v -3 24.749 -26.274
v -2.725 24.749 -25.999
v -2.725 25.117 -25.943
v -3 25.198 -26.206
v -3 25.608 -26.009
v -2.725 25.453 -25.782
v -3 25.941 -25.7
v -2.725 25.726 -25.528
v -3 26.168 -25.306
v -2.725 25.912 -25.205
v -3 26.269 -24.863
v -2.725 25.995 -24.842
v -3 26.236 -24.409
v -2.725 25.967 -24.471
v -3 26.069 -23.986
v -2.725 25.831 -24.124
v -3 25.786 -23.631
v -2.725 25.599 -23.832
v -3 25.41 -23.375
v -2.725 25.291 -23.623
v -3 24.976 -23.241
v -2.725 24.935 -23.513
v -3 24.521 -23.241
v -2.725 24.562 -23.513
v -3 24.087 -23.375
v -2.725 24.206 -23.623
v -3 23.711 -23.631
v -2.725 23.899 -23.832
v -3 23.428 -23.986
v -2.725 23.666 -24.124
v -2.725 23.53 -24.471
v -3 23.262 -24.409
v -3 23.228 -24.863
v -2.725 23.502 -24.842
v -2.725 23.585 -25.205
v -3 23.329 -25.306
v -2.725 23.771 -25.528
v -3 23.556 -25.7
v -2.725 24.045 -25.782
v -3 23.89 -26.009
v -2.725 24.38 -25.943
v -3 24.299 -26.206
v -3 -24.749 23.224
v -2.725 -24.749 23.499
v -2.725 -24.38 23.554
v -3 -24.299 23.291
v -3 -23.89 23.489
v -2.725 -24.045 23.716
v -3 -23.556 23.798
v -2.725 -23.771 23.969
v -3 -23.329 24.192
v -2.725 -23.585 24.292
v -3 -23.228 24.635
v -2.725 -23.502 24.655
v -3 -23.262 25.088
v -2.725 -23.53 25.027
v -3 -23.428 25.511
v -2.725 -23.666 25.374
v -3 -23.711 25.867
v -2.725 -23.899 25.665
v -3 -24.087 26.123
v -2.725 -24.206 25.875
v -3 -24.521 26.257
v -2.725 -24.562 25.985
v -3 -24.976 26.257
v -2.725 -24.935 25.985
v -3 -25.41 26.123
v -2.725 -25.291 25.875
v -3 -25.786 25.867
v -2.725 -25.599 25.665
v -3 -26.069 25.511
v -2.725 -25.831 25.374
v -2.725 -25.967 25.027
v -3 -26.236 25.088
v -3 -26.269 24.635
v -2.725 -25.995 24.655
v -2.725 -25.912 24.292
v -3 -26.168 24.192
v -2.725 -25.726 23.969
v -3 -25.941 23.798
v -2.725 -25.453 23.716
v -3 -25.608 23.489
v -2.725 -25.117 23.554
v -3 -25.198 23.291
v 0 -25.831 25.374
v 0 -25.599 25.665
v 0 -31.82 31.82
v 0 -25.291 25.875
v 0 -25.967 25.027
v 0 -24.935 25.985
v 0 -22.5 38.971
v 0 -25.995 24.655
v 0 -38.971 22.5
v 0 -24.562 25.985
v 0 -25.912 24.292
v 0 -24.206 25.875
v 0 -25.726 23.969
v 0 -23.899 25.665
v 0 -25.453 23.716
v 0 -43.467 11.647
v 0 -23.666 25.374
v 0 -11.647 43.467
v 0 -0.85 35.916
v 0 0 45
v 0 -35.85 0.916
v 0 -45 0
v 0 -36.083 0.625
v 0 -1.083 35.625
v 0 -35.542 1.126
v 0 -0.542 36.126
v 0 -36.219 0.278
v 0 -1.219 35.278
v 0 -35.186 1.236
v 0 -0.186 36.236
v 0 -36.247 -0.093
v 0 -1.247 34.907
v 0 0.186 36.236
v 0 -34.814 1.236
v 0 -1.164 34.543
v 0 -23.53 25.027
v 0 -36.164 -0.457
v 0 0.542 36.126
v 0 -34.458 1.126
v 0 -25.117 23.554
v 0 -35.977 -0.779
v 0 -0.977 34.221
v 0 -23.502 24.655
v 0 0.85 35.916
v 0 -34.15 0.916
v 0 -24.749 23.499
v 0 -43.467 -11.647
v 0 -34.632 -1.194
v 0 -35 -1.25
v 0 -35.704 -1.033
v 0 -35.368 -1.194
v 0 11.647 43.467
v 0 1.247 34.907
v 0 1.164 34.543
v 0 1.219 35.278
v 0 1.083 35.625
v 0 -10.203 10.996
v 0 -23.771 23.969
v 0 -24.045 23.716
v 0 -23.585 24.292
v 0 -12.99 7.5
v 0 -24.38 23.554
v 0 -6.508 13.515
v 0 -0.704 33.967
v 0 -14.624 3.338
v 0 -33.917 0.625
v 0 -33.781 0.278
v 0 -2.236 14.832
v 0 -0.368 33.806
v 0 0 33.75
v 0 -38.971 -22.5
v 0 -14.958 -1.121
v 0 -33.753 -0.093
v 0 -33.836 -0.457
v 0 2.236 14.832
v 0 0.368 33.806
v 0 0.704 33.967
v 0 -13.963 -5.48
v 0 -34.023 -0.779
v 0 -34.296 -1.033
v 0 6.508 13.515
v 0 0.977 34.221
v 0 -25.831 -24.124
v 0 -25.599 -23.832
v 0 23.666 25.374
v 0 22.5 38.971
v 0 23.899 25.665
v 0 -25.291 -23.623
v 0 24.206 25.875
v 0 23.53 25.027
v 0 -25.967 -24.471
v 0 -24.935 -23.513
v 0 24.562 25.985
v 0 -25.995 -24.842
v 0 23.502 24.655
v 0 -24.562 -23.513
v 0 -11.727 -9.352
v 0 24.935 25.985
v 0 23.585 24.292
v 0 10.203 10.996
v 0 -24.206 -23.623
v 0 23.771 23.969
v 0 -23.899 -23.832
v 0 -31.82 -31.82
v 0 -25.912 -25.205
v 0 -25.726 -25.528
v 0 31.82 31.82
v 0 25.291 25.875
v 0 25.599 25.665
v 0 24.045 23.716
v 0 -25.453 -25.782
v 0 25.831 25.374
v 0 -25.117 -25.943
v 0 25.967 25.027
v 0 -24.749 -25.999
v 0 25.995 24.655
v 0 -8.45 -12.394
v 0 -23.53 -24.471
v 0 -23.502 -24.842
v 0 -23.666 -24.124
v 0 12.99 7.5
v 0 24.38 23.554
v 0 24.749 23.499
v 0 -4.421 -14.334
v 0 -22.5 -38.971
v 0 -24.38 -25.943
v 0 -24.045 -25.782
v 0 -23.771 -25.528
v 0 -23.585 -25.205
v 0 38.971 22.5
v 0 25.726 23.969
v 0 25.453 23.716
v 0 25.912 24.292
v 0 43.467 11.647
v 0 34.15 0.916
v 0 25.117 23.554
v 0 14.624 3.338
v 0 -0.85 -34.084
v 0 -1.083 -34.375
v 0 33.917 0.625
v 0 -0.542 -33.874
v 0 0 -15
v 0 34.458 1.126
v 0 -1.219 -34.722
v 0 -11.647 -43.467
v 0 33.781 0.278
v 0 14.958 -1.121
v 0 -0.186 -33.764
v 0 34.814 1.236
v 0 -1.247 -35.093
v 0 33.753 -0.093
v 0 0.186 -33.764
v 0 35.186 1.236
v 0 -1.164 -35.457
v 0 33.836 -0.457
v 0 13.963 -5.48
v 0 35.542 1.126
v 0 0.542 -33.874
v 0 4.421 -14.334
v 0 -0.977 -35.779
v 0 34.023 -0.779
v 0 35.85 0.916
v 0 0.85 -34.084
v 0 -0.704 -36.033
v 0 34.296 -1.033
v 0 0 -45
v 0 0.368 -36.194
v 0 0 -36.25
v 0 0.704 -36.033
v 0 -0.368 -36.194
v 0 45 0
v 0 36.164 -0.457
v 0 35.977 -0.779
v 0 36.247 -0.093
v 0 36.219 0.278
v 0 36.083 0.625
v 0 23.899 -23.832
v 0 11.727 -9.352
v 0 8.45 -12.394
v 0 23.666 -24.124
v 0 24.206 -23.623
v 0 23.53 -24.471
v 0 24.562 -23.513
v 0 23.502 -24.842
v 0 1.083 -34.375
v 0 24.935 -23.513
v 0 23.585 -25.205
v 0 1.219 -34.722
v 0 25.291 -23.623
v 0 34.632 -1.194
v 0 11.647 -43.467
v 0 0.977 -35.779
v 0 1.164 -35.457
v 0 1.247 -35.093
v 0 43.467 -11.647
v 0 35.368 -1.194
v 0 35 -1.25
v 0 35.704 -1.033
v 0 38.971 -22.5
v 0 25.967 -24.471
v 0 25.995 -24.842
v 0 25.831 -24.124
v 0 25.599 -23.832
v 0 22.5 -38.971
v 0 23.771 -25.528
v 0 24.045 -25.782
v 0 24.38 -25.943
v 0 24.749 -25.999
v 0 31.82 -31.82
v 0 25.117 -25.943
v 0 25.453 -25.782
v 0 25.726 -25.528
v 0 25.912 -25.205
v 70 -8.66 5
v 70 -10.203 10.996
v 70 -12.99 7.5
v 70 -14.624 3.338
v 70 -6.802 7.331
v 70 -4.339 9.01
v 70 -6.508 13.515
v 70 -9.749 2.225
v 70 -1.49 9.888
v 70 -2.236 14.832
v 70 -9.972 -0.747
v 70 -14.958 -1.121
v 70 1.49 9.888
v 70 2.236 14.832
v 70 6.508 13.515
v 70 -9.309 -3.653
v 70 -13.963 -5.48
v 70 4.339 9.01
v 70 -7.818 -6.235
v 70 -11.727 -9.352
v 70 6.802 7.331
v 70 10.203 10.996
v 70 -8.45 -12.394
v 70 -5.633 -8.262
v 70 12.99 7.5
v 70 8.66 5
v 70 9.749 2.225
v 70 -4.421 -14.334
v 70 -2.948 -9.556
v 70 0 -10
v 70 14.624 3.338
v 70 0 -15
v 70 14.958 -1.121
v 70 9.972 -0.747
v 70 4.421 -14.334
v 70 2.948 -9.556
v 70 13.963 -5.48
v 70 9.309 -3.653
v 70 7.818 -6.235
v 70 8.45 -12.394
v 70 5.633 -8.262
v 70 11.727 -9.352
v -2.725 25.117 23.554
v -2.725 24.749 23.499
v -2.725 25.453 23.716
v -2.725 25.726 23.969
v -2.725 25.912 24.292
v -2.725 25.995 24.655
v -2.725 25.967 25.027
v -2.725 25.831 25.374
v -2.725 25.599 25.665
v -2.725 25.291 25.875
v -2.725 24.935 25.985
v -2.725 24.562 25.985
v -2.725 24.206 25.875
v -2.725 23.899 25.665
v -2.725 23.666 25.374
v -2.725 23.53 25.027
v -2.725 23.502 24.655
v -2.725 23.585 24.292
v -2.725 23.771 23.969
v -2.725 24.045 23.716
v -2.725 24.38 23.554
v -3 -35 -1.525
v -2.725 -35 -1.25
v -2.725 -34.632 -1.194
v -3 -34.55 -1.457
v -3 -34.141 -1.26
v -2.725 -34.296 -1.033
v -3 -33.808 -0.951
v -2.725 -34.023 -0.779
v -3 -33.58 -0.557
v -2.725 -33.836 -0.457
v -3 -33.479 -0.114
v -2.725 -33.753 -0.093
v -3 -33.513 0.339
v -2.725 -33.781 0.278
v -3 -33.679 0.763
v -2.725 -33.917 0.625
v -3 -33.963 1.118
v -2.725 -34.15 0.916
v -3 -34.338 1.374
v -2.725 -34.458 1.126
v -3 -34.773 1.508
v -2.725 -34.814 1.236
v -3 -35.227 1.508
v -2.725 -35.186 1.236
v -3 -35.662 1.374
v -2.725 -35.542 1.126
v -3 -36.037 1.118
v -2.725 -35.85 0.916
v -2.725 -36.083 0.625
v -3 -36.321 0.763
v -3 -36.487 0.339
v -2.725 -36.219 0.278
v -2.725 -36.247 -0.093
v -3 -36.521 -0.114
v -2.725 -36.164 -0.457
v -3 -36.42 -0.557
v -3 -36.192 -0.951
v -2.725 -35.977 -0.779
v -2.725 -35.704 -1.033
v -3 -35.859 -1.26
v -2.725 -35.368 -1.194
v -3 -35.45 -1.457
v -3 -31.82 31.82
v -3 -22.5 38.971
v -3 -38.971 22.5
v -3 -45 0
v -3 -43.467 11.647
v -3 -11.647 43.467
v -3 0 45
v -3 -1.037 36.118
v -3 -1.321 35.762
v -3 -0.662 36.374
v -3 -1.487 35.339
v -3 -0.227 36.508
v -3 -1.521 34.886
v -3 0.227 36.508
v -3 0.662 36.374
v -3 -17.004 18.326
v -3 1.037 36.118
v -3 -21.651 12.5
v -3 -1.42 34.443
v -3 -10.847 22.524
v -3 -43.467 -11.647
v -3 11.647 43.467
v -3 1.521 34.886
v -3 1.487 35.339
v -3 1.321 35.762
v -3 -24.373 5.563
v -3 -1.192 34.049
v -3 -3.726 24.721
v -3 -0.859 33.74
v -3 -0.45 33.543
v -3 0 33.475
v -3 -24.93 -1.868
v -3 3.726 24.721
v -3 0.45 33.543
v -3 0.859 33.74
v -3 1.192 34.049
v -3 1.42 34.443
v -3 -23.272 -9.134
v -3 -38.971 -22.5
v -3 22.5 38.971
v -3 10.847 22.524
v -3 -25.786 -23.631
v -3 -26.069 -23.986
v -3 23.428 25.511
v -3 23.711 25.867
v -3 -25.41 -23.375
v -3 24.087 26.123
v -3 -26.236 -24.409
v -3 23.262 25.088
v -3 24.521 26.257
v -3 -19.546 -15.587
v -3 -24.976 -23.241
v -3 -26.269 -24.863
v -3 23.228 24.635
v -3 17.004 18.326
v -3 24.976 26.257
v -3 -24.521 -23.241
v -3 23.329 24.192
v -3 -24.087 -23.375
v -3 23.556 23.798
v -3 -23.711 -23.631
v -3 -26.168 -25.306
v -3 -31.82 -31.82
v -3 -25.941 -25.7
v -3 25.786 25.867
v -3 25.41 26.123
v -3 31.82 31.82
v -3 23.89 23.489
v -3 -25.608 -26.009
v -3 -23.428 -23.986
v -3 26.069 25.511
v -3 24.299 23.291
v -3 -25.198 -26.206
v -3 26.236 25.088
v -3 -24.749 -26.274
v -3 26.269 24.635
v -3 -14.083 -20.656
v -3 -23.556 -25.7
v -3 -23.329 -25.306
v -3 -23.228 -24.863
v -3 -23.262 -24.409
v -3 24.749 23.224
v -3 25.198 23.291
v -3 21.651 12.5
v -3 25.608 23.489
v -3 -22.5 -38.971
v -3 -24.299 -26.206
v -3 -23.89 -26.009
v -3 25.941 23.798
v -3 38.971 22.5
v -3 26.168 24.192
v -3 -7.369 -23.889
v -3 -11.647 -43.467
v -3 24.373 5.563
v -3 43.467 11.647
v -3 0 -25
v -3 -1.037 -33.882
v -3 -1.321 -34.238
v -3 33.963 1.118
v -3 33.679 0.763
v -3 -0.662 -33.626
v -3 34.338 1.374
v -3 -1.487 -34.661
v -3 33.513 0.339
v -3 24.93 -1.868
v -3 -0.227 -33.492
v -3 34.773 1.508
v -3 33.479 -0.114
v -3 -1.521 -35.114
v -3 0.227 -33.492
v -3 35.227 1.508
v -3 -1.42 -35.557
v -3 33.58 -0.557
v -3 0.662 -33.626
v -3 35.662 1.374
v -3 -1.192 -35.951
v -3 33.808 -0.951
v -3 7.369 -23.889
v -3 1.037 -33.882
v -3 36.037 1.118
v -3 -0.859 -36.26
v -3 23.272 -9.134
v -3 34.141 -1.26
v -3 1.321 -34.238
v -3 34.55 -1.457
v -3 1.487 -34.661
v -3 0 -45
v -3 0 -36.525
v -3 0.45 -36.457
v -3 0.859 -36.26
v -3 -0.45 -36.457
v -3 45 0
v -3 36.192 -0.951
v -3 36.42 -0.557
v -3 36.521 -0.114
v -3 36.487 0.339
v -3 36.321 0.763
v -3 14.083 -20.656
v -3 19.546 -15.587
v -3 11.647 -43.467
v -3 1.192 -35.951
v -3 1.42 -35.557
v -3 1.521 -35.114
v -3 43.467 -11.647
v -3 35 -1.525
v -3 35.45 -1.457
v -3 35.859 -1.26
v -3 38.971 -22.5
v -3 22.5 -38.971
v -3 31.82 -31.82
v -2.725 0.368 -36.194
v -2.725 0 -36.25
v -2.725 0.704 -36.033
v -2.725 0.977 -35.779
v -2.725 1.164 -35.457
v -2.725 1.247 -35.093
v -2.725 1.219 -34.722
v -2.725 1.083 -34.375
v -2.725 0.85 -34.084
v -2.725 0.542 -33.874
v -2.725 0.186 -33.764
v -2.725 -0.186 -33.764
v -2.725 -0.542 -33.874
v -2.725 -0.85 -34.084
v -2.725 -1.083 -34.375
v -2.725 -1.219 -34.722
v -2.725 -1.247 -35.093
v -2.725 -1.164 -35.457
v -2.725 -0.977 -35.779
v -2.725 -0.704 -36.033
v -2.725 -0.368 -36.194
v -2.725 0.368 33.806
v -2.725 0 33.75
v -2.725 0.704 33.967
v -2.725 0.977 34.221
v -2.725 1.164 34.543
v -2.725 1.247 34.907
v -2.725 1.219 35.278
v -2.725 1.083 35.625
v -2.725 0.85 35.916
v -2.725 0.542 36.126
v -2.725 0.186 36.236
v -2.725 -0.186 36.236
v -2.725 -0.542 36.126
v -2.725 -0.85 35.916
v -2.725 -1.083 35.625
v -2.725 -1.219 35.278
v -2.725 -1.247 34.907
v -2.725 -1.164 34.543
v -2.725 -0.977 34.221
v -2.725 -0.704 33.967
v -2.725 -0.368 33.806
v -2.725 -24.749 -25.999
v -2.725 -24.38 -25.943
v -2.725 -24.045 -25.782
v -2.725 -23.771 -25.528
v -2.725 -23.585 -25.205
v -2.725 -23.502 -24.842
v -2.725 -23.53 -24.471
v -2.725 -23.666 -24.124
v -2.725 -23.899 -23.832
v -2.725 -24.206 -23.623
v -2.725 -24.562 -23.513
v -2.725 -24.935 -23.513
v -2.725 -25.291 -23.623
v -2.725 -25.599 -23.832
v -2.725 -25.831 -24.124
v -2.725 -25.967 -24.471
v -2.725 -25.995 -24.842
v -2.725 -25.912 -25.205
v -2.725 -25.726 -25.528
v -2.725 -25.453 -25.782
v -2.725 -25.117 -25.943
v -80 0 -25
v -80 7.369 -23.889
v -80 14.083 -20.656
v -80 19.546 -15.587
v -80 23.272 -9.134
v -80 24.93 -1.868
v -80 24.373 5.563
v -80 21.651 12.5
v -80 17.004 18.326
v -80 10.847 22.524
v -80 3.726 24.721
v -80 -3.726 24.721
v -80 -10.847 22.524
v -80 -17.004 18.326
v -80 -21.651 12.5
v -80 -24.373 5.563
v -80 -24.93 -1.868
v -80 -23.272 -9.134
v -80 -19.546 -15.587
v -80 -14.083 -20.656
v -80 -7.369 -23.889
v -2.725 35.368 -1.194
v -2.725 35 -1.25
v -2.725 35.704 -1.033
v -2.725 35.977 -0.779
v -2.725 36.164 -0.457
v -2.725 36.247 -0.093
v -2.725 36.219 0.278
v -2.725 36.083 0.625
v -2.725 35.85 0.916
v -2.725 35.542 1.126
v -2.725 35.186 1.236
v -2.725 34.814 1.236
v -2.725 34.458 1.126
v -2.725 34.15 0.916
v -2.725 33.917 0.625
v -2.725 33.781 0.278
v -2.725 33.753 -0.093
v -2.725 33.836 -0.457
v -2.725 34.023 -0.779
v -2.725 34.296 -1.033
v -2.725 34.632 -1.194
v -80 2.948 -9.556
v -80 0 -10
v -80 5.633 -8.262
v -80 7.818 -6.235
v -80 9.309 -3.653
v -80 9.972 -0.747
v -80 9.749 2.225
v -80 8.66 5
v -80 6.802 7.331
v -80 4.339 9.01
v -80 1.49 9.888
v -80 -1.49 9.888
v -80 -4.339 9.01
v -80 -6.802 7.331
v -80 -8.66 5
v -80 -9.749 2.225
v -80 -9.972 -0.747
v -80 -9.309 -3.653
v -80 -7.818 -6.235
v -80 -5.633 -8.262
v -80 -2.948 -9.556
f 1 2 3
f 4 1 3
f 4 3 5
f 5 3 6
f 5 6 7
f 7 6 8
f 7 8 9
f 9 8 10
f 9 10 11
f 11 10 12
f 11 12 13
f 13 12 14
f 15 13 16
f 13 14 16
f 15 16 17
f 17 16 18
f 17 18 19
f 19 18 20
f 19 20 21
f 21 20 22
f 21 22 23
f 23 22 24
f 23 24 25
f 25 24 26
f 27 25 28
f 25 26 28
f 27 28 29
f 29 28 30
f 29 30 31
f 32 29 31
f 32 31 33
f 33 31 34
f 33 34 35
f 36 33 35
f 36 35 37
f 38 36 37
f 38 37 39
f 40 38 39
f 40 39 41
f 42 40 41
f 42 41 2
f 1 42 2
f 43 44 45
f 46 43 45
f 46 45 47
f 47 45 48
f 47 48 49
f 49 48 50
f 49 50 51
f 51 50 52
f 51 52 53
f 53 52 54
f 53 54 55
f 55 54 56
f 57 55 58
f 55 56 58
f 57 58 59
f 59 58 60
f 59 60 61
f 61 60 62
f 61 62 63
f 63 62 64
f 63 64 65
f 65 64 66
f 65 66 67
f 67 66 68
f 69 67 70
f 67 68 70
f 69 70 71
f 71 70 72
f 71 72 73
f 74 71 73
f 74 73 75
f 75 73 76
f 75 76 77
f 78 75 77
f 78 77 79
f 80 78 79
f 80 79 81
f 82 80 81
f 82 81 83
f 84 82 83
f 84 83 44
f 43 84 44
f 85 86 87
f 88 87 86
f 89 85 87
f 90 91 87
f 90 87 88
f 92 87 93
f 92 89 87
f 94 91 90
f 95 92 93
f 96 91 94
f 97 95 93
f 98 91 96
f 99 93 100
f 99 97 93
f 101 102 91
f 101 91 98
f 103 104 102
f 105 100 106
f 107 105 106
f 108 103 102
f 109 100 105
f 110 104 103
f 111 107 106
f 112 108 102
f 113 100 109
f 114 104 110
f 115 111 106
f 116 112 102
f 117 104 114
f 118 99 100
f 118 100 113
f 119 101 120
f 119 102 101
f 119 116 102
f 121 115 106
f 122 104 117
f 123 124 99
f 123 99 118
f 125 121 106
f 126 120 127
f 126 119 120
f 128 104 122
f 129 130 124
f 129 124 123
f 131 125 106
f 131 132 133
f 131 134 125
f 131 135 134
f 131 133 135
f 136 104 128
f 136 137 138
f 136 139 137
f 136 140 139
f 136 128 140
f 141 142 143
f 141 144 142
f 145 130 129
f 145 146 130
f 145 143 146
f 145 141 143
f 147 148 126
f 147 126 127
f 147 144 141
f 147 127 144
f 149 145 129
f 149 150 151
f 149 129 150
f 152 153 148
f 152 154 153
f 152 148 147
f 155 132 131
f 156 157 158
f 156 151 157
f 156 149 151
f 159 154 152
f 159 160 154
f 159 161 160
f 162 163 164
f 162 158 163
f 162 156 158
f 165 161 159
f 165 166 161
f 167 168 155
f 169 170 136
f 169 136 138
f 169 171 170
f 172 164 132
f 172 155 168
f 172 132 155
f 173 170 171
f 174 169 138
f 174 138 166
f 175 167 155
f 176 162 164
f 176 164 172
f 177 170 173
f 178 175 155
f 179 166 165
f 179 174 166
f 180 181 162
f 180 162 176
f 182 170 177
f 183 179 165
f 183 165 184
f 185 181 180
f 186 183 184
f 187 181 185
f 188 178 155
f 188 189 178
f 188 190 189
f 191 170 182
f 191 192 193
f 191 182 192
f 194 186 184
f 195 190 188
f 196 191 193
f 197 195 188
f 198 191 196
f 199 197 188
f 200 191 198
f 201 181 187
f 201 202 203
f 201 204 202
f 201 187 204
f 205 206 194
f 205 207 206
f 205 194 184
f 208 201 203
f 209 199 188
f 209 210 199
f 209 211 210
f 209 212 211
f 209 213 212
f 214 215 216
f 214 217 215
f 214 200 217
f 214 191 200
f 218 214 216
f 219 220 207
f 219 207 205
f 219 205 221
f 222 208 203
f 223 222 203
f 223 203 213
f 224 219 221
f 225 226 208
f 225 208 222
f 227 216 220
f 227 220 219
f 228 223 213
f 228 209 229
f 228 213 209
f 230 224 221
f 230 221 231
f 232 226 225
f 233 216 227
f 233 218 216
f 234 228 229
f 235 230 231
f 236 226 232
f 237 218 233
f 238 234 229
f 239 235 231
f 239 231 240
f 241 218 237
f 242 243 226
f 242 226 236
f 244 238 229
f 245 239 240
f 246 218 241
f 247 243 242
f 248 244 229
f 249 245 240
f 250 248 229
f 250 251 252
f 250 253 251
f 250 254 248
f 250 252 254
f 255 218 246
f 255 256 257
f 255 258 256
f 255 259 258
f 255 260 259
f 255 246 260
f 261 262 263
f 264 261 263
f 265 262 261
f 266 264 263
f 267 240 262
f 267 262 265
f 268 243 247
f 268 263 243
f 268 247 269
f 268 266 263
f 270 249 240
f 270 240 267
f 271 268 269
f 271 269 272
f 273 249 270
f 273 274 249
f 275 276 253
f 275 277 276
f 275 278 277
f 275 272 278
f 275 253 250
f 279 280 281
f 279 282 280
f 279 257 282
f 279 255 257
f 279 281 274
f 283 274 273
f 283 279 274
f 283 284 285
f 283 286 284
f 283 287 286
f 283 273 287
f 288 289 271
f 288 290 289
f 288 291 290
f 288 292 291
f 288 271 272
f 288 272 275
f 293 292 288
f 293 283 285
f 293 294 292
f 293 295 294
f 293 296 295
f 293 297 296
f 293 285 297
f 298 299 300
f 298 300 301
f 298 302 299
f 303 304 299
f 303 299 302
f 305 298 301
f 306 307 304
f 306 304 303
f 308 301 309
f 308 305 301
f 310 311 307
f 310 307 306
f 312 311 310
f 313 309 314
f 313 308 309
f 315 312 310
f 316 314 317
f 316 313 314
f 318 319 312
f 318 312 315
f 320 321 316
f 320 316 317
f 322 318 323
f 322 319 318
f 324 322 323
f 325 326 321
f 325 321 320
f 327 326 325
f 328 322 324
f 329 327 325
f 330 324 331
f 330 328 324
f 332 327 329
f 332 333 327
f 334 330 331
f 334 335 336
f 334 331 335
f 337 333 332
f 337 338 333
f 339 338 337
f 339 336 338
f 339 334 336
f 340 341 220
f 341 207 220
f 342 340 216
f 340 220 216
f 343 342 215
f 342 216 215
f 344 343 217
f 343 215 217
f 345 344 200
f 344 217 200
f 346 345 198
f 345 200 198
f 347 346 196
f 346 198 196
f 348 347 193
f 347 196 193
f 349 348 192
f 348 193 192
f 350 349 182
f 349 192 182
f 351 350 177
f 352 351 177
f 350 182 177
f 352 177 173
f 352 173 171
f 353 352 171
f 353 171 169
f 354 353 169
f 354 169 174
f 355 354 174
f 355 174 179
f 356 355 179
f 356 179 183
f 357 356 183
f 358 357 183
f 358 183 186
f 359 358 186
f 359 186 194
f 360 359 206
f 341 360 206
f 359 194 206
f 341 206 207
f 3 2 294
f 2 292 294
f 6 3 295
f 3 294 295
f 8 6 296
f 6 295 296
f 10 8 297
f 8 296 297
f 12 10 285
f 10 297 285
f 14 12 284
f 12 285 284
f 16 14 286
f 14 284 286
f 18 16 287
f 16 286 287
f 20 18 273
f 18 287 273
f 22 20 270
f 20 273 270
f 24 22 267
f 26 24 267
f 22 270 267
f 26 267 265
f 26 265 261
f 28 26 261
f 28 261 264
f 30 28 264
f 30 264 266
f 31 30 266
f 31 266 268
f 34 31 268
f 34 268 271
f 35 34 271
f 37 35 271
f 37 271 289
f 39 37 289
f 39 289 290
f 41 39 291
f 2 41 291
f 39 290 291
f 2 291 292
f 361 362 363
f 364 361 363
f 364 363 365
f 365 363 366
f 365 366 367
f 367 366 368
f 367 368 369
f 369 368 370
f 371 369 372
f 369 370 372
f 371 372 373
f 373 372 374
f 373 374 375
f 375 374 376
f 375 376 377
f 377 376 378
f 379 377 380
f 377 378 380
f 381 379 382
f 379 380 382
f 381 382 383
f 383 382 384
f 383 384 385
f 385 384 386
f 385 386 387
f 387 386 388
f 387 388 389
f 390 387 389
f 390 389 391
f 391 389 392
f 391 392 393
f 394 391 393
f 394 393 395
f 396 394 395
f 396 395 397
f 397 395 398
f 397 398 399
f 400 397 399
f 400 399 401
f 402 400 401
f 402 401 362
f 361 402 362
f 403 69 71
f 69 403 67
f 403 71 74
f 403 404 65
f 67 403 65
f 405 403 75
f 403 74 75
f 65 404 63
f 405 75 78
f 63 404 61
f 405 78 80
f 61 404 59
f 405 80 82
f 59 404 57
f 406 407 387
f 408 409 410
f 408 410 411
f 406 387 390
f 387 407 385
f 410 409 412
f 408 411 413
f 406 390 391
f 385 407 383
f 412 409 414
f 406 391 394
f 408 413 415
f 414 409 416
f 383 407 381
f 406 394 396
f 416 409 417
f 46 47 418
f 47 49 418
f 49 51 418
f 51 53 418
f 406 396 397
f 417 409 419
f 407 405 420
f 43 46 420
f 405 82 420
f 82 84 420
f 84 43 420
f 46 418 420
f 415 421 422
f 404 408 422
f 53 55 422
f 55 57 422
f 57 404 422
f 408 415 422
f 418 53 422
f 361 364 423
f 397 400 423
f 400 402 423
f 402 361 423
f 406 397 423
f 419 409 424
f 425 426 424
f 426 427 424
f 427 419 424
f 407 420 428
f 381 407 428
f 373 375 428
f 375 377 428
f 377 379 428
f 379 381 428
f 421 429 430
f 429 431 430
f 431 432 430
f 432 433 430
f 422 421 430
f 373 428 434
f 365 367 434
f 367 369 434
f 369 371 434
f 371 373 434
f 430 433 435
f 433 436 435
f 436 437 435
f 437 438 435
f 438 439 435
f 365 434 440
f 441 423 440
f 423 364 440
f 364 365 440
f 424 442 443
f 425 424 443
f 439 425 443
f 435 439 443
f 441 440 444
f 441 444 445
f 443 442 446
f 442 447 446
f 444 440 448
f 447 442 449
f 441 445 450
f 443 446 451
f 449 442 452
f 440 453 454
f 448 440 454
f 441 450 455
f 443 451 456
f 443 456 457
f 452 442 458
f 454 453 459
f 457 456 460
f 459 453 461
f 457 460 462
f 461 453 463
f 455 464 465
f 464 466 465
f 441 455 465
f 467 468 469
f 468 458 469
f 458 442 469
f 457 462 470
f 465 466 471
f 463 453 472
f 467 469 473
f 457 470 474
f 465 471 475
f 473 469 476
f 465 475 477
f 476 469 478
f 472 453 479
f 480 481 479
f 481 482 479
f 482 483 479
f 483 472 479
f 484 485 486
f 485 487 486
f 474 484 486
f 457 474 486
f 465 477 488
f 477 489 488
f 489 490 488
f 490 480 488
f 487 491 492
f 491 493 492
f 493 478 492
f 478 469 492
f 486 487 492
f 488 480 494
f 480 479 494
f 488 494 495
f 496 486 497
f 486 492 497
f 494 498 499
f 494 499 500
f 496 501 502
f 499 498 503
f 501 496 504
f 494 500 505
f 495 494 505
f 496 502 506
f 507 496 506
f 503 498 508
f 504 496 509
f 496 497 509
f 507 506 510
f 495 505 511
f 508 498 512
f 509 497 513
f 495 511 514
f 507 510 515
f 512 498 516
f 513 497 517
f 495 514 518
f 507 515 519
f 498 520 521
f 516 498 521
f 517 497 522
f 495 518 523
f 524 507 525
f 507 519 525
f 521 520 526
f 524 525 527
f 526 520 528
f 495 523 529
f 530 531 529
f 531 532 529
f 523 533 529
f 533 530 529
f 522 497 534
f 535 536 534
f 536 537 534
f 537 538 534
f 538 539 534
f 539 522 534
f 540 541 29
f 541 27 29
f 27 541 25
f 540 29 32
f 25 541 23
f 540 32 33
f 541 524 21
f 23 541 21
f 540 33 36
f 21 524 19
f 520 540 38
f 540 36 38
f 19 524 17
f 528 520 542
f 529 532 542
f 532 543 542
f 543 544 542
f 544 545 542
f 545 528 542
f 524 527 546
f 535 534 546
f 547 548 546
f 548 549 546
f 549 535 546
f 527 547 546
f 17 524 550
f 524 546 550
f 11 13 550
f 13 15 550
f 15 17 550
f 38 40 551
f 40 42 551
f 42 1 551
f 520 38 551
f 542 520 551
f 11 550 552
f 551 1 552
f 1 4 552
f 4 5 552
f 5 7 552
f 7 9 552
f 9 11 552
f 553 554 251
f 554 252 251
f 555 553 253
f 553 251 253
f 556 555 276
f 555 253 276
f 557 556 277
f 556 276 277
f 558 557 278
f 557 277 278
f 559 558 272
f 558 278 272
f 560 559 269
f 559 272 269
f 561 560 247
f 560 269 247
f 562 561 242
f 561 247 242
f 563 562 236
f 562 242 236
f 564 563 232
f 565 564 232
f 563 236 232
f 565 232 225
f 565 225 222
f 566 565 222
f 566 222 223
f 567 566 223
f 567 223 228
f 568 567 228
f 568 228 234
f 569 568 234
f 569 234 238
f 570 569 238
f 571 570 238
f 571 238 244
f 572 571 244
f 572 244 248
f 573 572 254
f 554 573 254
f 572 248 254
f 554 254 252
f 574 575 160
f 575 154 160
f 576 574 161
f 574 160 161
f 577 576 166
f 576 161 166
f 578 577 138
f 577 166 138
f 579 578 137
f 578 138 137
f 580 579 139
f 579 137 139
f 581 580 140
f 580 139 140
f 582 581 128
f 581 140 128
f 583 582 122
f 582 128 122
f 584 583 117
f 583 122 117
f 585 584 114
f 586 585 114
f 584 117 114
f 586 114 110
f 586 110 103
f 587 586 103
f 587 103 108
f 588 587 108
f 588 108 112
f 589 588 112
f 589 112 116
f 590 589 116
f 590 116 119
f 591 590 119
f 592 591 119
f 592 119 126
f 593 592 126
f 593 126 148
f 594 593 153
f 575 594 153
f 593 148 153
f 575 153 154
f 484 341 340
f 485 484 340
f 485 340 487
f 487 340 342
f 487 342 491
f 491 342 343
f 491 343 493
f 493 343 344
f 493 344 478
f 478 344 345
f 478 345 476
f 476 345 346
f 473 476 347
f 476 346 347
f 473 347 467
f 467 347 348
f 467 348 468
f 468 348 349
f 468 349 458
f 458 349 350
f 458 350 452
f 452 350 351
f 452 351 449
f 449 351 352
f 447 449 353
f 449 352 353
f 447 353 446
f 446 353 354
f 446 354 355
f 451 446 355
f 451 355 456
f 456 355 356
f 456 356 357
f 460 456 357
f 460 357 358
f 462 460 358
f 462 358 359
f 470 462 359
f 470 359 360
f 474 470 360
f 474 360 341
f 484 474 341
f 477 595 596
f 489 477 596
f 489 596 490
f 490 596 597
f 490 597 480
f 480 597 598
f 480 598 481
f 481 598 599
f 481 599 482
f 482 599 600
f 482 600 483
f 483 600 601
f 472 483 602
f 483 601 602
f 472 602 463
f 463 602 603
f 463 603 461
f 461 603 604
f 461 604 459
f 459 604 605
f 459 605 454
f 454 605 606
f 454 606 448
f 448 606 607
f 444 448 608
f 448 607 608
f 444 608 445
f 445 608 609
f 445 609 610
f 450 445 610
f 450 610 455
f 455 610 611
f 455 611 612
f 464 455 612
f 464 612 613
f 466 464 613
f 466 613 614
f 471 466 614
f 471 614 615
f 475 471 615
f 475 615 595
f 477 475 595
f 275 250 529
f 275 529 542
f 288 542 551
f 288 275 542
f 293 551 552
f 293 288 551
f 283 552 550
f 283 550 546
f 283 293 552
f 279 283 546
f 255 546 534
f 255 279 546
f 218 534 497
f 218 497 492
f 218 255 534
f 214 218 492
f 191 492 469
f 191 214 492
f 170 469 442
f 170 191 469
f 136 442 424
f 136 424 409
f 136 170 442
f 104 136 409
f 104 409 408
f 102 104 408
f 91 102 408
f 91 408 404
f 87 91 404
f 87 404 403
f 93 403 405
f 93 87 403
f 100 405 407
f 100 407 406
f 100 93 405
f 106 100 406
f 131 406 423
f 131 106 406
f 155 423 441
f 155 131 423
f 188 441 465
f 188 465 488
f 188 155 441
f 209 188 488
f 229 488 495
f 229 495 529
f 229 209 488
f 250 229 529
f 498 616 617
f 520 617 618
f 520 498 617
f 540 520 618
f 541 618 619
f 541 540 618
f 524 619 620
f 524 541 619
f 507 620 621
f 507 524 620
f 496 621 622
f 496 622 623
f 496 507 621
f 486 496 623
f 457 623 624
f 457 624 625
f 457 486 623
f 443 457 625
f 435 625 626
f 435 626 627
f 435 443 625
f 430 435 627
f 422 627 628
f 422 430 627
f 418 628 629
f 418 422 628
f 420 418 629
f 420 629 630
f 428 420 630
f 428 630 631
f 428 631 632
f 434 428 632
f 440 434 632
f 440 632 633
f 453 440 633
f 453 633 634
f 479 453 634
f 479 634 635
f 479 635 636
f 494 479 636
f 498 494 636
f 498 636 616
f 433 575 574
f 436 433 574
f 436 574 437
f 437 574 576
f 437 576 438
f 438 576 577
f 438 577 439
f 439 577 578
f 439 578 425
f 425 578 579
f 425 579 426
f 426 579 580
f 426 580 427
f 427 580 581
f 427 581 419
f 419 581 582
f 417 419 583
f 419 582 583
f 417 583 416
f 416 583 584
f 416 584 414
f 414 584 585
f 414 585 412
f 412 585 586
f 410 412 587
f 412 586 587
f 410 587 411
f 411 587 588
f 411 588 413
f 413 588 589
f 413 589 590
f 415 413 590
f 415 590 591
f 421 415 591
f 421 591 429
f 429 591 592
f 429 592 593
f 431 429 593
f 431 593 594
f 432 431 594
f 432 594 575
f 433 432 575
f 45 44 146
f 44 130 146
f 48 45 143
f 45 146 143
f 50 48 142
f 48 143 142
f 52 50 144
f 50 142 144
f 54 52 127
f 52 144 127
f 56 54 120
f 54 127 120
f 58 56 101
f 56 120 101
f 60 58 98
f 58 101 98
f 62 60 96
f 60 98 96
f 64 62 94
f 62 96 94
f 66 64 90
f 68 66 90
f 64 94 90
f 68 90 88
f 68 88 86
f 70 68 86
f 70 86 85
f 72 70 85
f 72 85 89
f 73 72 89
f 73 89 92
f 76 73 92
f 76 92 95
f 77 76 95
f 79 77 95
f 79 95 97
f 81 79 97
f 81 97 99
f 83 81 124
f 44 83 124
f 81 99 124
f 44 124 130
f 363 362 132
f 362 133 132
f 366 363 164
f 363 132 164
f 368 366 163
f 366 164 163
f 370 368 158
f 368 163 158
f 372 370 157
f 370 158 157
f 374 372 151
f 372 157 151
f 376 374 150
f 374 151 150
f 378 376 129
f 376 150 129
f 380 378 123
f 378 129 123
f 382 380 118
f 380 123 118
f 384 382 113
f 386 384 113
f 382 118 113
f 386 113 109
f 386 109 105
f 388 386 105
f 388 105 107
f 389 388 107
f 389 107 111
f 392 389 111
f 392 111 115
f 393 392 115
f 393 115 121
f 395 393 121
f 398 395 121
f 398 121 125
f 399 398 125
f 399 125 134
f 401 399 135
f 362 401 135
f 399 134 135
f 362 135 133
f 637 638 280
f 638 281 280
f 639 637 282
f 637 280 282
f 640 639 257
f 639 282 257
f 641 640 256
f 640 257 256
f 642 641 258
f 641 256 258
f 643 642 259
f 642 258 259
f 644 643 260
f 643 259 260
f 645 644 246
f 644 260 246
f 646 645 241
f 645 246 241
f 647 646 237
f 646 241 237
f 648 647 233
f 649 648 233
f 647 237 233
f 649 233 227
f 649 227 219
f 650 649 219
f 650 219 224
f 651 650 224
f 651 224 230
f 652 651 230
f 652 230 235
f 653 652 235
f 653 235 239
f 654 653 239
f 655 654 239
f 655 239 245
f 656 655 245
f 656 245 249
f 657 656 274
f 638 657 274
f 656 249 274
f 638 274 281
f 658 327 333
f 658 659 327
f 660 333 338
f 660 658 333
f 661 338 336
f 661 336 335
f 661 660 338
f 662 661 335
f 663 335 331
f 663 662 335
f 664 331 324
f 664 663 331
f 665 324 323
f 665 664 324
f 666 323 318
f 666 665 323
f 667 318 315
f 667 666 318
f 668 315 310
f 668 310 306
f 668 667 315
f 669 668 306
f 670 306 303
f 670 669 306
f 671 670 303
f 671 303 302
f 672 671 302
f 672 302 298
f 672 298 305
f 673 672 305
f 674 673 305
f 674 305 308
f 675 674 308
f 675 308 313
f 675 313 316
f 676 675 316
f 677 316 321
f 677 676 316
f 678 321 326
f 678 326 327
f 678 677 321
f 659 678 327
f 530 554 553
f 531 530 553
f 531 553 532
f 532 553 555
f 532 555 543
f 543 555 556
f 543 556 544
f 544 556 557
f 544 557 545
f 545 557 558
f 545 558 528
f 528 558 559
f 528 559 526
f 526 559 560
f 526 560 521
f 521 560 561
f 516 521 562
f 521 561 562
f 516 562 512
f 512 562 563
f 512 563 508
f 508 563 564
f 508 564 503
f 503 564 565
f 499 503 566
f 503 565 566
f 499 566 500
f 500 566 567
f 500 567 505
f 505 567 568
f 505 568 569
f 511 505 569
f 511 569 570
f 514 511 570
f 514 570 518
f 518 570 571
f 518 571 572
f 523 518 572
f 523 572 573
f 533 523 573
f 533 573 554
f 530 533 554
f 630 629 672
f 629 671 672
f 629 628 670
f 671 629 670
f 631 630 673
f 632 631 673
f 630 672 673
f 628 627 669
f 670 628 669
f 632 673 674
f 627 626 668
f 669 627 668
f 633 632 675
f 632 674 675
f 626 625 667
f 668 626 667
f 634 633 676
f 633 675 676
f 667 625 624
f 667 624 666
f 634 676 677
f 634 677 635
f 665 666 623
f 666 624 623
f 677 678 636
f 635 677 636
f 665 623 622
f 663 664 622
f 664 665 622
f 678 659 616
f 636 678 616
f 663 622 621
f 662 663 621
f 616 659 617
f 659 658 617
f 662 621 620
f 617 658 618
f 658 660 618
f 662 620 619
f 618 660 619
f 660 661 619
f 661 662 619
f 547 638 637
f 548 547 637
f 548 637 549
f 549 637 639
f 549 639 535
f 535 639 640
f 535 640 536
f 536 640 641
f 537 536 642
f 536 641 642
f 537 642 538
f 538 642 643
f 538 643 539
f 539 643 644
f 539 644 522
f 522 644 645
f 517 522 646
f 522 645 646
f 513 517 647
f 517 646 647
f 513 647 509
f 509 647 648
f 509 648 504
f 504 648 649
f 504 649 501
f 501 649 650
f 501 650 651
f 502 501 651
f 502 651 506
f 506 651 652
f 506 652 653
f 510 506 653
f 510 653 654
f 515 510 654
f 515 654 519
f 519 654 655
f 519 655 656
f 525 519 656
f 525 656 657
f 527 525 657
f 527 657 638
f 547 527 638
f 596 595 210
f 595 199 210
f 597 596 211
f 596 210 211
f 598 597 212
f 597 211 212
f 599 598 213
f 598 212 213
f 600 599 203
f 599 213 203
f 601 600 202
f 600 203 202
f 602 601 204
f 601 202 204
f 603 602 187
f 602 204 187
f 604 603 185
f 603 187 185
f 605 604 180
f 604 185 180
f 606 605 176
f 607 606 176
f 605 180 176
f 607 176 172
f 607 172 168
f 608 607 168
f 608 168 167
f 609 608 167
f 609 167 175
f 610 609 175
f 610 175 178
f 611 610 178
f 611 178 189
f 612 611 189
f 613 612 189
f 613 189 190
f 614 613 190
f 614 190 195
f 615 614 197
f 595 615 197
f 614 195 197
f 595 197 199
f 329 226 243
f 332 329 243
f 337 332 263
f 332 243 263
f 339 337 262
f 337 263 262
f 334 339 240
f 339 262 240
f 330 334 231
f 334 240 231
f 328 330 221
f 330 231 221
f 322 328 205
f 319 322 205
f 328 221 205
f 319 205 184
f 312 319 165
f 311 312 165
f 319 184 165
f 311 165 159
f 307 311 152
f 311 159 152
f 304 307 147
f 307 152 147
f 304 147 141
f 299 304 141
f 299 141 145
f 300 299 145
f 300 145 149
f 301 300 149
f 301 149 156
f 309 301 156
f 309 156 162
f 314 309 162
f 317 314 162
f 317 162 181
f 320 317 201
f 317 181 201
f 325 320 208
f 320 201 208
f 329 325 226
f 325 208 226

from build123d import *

# Parameters (mm, degrees)
SKETCH1_R                   = 25
SKETCH1_R_2                 = 10
BOSS_EXTRUDE1_DEPTH         = 80
SKETCH1_3_R                 = 15
SKETCH1_3_R_2               = 10
BOSS_EXTRUDE2_DEPTH         = 70
SKETCH1_4_R                 = 45
SKETCH1_4_R_2               = 25
BOSS_EXTRUDE3_DEPTH         = 3
M3_TAPPED_HOLE1_D           = 2.5
M3_TAPPED_HOLE1_CSINK_D     = 3.05
M3_TAPPED_HOLE1_CSINK_ANGLE = 90


with BuildPart() as part:
    # Sketch1 → Boss-Extrude1 (new body)
    with BuildSketch(Plane(origin=(0, 0, 0), x_dir=(0, 0, -1), z_dir=(1, 0, 0))):
        Circle(SKETCH1_R)
        Circle(SKETCH1_R_2, mode=Mode.SUBTRACT)
    extrude(amount=-BOSS_EXTRUDE1_DEPTH)



with BuildPart() as body_2:
    # Sketch1<3> → Boss-Extrude2 (new body)
    with BuildSketch(Plane(origin=(0, 0, 0), x_dir=(0, 0, -1), z_dir=(1, 0, 0))):
        Circle(SKETCH1_3_R)
        Circle(SKETCH1_3_R_2, mode=Mode.SUBTRACT)
    extrude(amount=BOSS_EXTRUDE2_DEPTH)


with BuildPart() as part_1:
    add(part.part)

    add(body_2.part)  # Boss-Extrude3 merges body 2
    # Sketch1<4> → Boss-Extrude3 (add)
    with BuildSketch(Plane(origin=(0, 0, 0), x_dir=(0, 0, -1), z_dir=(1, 0, 0))):
        Circle(SKETCH1_4_R)
        Circle(SKETCH1_4_R_2, mode=Mode.SUBTRACT)
    extrude(amount=-BOSS_EXTRUDE3_DEPTH)

    # M3 Tapped Hole1 (through all)
    with Locations(Plane.ZY.offset(3)):
        with Locations((35, 0), (0, 35), (-35, 0), (0, -35), (24.748737342, 24.748737342), (-24.748737342, 24.748737342), (-24.748737342, -24.748737342), (24.748737342, -24.748737342)):
            CounterSinkHole(M3_TAPPED_HOLE1_D / 2, M3_TAPPED_HOLE1_CSINK_D / 2, counter_sink_angle=M3_TAPPED_HOLE1_CSINK_ANGLE)


solid = part_1.part
